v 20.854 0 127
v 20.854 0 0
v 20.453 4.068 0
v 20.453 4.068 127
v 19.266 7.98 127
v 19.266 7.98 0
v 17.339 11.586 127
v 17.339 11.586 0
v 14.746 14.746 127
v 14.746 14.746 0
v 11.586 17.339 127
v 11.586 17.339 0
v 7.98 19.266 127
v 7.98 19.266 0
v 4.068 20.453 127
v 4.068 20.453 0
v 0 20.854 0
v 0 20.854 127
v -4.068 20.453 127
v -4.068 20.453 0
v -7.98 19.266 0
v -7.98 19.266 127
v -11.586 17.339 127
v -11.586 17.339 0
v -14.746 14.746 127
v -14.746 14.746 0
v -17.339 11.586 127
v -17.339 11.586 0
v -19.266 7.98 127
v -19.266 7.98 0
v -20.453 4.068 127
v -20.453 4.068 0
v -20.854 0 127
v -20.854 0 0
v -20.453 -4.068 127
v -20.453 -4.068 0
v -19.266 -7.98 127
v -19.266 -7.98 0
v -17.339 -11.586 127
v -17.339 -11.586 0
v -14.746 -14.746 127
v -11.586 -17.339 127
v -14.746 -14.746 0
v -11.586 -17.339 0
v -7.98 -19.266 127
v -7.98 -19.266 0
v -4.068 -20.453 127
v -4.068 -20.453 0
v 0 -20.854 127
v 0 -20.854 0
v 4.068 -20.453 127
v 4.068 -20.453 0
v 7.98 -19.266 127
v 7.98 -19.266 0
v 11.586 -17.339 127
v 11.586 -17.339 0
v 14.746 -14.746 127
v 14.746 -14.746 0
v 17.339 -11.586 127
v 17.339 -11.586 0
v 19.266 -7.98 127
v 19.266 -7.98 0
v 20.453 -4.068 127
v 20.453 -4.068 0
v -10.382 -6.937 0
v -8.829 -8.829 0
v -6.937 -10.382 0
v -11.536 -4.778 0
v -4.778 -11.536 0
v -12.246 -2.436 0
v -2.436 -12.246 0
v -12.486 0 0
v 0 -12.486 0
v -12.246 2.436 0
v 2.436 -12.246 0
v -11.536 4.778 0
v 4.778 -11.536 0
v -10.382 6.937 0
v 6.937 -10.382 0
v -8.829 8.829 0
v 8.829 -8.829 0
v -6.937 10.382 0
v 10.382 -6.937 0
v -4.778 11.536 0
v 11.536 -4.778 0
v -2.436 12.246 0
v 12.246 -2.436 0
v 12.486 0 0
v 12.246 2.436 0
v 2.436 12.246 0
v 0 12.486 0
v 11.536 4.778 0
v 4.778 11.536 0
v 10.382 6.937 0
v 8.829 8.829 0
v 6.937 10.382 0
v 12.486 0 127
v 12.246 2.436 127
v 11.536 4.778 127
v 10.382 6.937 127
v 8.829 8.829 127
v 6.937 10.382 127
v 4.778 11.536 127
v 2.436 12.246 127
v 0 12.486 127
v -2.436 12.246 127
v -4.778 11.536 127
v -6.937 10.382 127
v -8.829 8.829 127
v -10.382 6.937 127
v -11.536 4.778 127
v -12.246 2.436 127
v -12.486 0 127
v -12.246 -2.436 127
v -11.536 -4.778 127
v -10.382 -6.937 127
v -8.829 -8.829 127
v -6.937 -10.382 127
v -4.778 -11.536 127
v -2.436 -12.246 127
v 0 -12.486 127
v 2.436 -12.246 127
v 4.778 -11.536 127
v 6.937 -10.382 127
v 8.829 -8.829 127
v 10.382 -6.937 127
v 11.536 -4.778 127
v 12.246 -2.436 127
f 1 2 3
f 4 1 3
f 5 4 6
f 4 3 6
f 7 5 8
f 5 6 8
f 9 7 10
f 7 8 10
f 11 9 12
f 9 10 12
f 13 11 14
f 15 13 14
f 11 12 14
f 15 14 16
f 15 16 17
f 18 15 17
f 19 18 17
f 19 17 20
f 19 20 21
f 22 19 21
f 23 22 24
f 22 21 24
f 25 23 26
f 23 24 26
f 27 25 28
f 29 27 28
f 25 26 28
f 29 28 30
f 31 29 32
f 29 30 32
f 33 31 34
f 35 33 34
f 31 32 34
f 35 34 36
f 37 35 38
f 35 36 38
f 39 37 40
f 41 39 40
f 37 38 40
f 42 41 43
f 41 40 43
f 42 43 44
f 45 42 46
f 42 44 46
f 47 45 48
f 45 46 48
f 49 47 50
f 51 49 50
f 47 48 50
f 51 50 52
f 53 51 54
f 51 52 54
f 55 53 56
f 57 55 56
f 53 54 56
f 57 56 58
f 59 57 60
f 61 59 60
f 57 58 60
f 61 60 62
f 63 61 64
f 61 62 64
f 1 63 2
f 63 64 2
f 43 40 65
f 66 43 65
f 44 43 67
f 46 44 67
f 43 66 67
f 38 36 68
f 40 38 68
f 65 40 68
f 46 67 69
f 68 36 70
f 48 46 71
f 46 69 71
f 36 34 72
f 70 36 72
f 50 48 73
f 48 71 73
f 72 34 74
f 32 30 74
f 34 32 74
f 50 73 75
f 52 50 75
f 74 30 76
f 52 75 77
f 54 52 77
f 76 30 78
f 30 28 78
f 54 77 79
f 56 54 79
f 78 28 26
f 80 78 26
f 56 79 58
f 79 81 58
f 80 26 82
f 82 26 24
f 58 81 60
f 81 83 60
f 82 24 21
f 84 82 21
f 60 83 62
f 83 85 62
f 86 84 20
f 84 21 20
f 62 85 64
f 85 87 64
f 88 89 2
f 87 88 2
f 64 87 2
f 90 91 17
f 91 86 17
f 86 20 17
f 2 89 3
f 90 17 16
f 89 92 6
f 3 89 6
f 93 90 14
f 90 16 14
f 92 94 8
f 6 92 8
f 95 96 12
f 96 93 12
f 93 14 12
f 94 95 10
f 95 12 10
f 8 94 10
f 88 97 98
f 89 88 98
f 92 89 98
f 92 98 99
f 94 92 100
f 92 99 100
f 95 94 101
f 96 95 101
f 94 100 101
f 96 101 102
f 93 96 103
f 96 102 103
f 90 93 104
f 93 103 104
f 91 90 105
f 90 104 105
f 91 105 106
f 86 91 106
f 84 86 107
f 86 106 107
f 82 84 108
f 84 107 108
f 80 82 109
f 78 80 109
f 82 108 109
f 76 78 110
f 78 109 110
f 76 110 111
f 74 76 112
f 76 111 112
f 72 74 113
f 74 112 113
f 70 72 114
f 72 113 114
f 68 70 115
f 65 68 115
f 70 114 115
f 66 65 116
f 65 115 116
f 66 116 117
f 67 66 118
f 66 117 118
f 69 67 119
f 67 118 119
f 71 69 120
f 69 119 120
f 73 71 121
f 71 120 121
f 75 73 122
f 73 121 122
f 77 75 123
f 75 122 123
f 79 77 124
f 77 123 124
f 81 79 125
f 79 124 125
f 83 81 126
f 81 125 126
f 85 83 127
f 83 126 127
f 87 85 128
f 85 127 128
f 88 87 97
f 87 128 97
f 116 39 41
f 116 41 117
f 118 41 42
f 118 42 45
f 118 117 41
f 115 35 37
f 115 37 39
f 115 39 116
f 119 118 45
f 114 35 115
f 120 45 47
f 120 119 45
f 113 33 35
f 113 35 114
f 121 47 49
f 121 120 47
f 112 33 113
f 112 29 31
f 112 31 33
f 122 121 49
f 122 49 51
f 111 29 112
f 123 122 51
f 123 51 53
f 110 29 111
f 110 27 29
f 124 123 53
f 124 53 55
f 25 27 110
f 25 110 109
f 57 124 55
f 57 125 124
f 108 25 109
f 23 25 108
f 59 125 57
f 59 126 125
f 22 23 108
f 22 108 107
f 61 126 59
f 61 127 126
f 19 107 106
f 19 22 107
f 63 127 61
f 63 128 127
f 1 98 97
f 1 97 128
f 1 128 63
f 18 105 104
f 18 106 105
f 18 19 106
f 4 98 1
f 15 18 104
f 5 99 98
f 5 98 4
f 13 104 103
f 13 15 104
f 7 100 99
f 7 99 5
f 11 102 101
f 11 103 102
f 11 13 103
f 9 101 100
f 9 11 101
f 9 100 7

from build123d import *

# Parameters (mm, degrees)
F0_R     = 20.853702
F1_DEPTH = 127
F2_R     = 9.377492
F3_DEPTH = 127
F4_R     = 12.486205
F5_DEPTH = 127


with BuildPart() as f1:
    # F0 (on Top) → F1 (new body)
    with BuildSketch(Plane.XY):
        Circle(F0_R)
    extrude(amount=F1_DEPTH)

    # F2 (on Top) → F3 (cut)
    with BuildSketch(Plane.XY):
        Circle(F2_R)
    extrude(amount=-F3_DEPTH, mode=Mode.SUBTRACT)

    # F4 (on face) → F5 (cut)
    with BuildSketch(Plane.XY.offset(127)):
        Circle(F4_R)
    extrude(amount=-F5_DEPTH, mode=Mode.SUBTRACT)


solid = f1.part
